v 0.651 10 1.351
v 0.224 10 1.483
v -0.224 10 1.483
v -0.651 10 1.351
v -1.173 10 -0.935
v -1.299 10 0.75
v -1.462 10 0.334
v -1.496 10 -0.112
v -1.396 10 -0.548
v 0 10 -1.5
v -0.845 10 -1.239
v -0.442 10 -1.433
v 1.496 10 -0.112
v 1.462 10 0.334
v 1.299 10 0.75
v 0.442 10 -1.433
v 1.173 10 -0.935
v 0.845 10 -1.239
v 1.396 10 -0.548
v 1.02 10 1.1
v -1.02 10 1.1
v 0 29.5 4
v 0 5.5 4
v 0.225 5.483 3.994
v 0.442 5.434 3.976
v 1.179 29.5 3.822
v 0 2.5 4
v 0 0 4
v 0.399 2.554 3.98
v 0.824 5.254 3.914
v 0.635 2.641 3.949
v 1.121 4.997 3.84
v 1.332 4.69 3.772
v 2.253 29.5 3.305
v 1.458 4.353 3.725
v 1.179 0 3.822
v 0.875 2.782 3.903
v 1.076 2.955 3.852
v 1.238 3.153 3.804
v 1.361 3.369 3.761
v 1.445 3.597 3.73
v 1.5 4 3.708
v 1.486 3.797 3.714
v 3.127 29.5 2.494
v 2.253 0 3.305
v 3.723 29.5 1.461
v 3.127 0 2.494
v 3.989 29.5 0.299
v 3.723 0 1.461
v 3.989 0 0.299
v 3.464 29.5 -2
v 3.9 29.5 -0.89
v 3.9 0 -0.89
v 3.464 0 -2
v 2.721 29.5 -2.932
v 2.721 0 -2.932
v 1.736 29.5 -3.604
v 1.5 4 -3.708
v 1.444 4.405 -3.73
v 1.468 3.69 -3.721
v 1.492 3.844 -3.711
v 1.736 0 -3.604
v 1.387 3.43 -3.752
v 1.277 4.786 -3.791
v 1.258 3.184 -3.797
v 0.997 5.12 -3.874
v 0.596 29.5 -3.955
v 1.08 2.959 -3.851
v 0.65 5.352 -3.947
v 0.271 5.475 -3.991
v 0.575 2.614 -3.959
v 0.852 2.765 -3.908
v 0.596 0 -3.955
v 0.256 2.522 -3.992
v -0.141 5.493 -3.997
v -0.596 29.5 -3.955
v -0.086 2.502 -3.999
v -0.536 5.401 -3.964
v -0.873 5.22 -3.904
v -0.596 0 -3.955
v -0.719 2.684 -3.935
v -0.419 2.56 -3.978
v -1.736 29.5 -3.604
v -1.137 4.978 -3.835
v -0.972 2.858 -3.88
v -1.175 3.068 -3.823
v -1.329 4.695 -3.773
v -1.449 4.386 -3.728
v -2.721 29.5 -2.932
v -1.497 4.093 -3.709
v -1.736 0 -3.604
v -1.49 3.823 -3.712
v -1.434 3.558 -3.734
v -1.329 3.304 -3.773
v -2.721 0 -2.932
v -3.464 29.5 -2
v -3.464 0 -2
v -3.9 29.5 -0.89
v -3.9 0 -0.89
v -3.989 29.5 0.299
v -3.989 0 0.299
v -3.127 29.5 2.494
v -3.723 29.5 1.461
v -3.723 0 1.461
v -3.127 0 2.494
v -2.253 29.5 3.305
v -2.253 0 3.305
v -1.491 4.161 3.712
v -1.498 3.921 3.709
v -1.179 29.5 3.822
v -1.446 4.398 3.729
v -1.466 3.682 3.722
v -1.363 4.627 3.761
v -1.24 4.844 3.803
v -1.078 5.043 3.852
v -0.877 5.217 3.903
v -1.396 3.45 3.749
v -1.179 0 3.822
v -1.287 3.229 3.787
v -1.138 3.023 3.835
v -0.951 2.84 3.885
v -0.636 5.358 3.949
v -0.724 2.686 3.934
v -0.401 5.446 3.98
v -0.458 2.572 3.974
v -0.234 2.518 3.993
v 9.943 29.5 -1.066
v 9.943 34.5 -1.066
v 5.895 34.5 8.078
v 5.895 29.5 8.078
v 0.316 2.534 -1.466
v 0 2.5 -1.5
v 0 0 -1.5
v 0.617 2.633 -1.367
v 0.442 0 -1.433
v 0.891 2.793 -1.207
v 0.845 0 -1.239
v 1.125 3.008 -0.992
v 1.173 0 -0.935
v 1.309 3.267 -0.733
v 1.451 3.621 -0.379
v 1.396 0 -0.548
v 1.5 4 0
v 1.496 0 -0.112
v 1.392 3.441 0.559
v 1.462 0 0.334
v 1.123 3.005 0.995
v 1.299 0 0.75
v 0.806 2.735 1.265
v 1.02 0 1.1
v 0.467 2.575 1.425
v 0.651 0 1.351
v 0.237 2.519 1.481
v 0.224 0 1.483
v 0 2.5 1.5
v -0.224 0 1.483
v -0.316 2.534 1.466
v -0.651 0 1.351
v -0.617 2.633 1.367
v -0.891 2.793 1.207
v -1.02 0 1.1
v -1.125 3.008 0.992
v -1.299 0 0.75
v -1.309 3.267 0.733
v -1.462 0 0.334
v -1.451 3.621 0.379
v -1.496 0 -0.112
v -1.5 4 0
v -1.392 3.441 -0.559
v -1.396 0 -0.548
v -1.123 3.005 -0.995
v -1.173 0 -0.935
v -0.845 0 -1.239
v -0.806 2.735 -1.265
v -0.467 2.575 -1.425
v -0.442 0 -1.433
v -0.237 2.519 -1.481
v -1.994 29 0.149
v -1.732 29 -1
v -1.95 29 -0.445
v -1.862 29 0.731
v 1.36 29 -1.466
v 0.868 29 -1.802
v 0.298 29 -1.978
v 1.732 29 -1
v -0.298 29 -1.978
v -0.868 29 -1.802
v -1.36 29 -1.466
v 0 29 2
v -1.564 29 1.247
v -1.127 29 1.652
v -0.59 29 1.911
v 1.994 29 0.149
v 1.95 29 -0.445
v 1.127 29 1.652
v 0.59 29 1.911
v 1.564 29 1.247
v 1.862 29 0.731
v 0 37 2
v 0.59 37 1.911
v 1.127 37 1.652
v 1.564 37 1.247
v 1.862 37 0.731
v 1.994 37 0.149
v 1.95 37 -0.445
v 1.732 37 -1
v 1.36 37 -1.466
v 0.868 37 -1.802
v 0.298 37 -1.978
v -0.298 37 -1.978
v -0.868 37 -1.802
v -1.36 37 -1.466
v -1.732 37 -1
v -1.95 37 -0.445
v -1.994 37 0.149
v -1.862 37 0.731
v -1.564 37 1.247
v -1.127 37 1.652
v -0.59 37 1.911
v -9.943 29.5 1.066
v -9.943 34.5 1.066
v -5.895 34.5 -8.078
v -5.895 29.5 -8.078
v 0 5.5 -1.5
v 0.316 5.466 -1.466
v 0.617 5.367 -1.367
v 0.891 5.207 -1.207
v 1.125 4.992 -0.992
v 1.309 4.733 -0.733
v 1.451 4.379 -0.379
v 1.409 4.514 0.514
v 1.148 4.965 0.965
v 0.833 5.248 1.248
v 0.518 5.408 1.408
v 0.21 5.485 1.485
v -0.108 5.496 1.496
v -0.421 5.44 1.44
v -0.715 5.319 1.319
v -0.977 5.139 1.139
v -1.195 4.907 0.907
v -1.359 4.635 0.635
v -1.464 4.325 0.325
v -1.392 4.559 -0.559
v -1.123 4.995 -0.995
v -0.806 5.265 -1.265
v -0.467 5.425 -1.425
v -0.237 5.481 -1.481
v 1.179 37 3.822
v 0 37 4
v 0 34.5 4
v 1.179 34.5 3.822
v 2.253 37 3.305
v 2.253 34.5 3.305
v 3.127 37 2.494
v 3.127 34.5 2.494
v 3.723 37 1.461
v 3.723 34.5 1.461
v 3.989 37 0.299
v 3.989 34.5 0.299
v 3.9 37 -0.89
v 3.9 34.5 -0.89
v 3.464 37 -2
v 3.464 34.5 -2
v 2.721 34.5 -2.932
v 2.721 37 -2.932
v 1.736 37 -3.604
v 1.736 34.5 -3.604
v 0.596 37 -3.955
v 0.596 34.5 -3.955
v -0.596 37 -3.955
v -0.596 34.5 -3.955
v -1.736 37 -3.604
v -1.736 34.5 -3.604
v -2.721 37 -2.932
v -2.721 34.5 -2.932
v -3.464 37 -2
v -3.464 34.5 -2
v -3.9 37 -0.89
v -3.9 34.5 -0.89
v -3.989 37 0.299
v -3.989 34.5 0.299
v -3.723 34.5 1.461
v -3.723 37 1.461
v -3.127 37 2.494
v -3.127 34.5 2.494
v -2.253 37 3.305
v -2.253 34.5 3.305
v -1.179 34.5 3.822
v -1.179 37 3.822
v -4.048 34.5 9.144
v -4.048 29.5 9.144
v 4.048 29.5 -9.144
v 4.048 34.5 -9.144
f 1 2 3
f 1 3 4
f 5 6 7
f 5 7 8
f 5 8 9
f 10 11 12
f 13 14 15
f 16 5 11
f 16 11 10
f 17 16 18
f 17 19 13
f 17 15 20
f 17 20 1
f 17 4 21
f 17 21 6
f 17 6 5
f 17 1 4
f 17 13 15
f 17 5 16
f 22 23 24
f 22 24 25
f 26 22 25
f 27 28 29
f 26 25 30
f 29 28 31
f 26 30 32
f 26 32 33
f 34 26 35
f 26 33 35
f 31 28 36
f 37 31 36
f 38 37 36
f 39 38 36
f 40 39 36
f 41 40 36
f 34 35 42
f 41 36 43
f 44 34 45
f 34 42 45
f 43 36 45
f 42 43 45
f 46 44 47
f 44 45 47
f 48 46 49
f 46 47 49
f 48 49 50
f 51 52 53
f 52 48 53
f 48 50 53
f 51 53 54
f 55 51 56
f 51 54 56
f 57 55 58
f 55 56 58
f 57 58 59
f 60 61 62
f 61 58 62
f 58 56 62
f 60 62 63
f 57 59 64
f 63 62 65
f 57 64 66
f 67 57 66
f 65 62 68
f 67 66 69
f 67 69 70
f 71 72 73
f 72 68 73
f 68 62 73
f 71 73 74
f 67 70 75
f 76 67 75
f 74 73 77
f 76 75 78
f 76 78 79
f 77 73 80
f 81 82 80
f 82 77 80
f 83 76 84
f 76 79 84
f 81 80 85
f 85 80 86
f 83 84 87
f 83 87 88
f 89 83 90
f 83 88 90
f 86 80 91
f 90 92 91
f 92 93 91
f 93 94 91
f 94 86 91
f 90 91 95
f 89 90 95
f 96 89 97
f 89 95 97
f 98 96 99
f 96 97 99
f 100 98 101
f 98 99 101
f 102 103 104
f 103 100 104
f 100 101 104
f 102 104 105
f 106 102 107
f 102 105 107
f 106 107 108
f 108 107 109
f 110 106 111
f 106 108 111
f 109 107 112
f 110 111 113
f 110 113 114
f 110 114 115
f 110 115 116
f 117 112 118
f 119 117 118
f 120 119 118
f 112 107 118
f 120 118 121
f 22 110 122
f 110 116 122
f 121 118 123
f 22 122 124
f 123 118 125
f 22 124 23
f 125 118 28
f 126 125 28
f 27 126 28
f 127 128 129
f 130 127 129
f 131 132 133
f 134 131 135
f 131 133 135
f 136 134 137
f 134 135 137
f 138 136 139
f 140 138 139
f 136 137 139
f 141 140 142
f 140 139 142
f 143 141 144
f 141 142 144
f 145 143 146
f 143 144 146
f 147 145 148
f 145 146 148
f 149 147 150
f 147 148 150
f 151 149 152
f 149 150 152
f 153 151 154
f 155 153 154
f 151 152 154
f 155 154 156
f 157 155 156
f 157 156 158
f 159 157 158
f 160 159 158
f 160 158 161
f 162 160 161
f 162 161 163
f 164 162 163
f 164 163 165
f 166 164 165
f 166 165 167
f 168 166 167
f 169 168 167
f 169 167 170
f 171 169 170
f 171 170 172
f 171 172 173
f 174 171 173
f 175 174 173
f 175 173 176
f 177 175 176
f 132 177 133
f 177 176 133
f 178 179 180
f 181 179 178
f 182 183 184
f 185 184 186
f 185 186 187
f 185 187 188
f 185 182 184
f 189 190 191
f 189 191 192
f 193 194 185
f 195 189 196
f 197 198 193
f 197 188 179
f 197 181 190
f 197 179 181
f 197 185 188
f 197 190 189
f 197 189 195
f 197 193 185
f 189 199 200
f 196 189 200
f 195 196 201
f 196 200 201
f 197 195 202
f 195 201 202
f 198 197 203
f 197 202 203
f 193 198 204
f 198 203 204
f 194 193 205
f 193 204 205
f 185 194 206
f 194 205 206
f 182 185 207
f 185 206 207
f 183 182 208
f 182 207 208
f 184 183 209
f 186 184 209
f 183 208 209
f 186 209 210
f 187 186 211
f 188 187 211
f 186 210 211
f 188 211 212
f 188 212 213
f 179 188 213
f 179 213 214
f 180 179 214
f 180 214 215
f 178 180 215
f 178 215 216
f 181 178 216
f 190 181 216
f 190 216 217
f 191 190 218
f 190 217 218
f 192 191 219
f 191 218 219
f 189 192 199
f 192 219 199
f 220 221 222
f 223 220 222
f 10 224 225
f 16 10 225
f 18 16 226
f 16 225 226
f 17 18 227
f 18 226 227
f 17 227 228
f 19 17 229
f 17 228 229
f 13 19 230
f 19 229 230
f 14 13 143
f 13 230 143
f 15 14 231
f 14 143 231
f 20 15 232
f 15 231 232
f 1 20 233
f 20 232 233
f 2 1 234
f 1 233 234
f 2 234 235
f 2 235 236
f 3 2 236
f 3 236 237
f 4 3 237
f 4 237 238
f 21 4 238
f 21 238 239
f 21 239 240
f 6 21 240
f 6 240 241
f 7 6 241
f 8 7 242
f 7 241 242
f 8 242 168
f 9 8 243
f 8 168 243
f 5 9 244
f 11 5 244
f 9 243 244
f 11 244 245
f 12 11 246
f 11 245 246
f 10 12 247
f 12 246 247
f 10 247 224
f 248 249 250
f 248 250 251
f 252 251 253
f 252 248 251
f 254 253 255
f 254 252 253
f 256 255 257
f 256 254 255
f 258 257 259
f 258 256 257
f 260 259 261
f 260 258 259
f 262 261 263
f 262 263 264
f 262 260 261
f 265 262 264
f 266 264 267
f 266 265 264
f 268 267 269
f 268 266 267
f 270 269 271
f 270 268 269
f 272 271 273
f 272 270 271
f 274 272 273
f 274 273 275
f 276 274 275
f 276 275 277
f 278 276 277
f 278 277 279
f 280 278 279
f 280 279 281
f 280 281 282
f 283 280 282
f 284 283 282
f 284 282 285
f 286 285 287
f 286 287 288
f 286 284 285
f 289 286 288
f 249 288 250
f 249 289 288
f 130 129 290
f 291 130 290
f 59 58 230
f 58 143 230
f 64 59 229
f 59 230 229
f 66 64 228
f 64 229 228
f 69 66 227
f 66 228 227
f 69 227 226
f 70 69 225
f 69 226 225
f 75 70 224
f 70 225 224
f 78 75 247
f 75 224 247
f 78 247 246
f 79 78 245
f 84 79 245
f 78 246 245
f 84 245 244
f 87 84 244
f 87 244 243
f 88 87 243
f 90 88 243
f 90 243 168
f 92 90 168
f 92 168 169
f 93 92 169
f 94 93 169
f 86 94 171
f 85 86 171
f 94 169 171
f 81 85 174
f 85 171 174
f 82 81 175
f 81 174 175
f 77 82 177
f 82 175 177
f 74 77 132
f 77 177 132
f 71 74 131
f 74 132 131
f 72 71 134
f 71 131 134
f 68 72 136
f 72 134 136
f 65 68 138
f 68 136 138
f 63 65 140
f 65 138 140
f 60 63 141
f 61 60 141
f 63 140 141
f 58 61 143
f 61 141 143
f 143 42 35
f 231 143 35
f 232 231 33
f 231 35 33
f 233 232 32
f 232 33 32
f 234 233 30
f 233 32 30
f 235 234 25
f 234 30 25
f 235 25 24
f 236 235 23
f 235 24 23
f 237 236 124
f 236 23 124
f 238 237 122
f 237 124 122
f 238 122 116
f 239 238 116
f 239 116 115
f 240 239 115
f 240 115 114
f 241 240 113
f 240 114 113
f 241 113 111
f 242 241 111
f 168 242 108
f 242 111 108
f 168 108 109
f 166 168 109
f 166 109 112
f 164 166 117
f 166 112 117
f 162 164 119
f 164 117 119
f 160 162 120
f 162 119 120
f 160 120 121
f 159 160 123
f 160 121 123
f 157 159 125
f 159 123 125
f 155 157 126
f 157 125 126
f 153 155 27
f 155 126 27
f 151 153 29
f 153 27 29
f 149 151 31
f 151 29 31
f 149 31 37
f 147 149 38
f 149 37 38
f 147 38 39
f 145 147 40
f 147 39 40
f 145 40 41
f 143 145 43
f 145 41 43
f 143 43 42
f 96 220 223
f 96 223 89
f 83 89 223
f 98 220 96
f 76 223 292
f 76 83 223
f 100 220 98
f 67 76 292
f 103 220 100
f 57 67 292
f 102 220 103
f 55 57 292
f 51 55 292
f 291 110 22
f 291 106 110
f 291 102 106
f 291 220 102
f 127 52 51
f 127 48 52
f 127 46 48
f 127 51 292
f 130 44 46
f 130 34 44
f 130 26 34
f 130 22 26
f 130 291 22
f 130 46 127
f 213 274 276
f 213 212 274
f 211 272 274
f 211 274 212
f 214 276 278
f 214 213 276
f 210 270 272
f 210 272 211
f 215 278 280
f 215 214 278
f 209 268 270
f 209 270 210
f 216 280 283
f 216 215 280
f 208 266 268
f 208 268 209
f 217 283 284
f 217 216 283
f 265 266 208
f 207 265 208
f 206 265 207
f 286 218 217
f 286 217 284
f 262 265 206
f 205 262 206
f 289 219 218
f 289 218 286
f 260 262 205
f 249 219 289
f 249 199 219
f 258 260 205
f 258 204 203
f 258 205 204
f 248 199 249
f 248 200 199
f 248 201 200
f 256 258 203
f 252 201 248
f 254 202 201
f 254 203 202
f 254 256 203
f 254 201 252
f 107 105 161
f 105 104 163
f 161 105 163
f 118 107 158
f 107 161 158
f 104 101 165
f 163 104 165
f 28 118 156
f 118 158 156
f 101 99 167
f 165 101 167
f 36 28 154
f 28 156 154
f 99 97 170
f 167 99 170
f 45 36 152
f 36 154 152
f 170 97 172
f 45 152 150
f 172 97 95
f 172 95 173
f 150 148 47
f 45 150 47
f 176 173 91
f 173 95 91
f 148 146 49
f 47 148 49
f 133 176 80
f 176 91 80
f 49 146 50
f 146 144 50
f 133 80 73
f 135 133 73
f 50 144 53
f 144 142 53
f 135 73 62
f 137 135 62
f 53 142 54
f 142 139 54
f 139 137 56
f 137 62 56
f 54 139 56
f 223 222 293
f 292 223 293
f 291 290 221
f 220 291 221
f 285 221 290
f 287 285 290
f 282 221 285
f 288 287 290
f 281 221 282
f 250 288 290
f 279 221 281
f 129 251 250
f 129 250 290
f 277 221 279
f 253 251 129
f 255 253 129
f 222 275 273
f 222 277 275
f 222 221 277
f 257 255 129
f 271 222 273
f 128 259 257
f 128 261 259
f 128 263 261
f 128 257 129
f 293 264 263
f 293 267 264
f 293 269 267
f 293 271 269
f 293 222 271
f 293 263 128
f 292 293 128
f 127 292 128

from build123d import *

# Parameters (mm, degrees)
SKETCH1_R              = 5
BOSS_EXTRUDE1_DEPTH    = 37
SKETCH2_R              = 1.5
CUT_EXTRUDE1_DEPTH     = 10
CUT_EXTRUDE2_OUTLINE_W = 1.5
CUT_EXTRUDE2_OUTLINE_H = 10.000157131
CUT_EXTRUDE3_START     = -28.5
SKETCH3_R              = 5
SKETCH3_R_2            = 4
CUT_EXTRUDE3_DEPTH     = 28.5
SKETCH4_R              = 12
BOSS_EXTRUDE2_DEPTH    = 2.5
BOSS_EXTRUDE3_DEPTH    = 5
SKETCH7_R              = 12
SKETCH7_R_2            = 4
CUT_EXTRUDE4_DEPTH     = 2.5
SKETCH8_R              = 2
CUT_EXTRUDE5_DEPTH     = 8
SKETCH9_R              = 5
SKETCH9_R_2            = 4
CUT_EXTRUDE6_DEPTH     = 32.539281195


# Read off the part's stored shape, not the designer's step: Cut-Extrude2
with BuildPart() as part:
    # Sketch1 → Boss-Extrude1 (new body)
    with BuildSketch(Plane(origin=(0, 0, 0), x_dir=(1, 0, 0), z_dir=(0, 1, 0))):
        Circle(SKETCH1_R)
    extrude(amount=BOSS_EXTRUDE1_DEPTH)

    # Sketch2 → Cut-Extrude1 (cut)
    with BuildSketch(Plane(origin=(0, 0, 0), x_dir=(-1, 0, 0), z_dir=(0, -1, 0))):
        with Locations(Location((0, 0, 0), (0, 0, 90))):
            Circle(SKETCH2_R)
    extrude(amount=-CUT_EXTRUDE1_DEPTH, mode=Mode.SUBTRACT)

    # Cut-Extrude2 outline → Cut-Extrude2 (revolve, cut)
    with BuildSketch(Plane.XZ.offset(-4)):
        with Locations((0.75, -4.8215e-05)):
            Rectangle(CUT_EXTRUDE2_OUTLINE_W, CUT_EXTRUDE2_OUTLINE_H)
    revolve(axis=Axis((0, 4, 0), (0, 0, 1)), mode=Mode.SUBTRACT)

    # Sketch3 → Cut-Extrude3 (cut)
    with BuildSketch(Plane(origin=(0, 37, 0), x_dir=(1, 0, 0), z_dir=(0, 1, 0)).offset(CUT_EXTRUDE3_START)):
        with Locations(Location((0, 0, 0), (0, 0, 270))):
            Circle(SKETCH3_R)
        with Locations(Location((0, 0, 0), (0, 0, 270))):
            Circle(SKETCH3_R_2, mode=Mode.SUBTRACT)
    extrude(amount=CUT_EXTRUDE3_DEPTH, mode=Mode.SUBTRACT)

    # Sketch4 → Boss-Extrude2 (add)
    with BuildSketch(Plane(origin=(0, 37, 0), x_dir=(1, 0, 0), z_dir=(0, 1, 0))):
        with Locations(Location((0, 0, 0), (0, 0, 270))):
            Circle(SKETCH4_R)
    extrude(amount=-BOSS_EXTRUDE2_DEPTH)

    # Sketch6 → Boss-Extrude3 (add)
    with BuildSketch(Plane.XZ.offset(-34.5)):
        Polygon((-4.048056056, 9.144027677), (-9.94298829, 1.066294458), (-5.894932233, -8.077733219), (4.048056056, -9.144027677), (9.94298829, -1.066294458), (5.894932233, 8.077733219), align=None)
    extrude(amount=BOSS_EXTRUDE3_DEPTH)

    # Sketch7 → Cut-Extrude4 (cut)
    with BuildSketch(Plane(origin=(0, 37, 0), x_dir=(1, 0, 0), z_dir=(0, 1, 0))):
        Circle(SKETCH7_R)
        with Locations(Location((0, 0, 0), (0, 0, 270))):
            Circle(SKETCH7_R_2, mode=Mode.SUBTRACT)
    extrude(amount=-CUT_EXTRUDE4_DEPTH, mode=Mode.SUBTRACT)

    # Sketch8 → Cut-Extrude5 (cut)
    with BuildSketch(Plane(origin=(0, 37, 0), x_dir=(1, 0, 0), z_dir=(0, 1, 0))):
        with Locations(Location((0, 0, 0), (0, 0, 270))):
            Circle(SKETCH8_R)
    extrude(amount=-CUT_EXTRUDE5_DEPTH, mode=Mode.SUBTRACT)

    # Sketch9 → Cut-Extrude6 (cut, through all)
    with BuildSketch(Plane(origin=(0, 8.5, 0), x_dir=(1, 0, 0), z_dir=(0, 1, 0))):
        Circle(SKETCH9_R)
        with Locations(Location((0, 0, 0), (0, 0, 270))):
            Circle(SKETCH9_R_2, mode=Mode.SUBTRACT)
    extrude(amount=-CUT_EXTRUDE6_DEPTH, mode=Mode.SUBTRACT)


solid = part.part
